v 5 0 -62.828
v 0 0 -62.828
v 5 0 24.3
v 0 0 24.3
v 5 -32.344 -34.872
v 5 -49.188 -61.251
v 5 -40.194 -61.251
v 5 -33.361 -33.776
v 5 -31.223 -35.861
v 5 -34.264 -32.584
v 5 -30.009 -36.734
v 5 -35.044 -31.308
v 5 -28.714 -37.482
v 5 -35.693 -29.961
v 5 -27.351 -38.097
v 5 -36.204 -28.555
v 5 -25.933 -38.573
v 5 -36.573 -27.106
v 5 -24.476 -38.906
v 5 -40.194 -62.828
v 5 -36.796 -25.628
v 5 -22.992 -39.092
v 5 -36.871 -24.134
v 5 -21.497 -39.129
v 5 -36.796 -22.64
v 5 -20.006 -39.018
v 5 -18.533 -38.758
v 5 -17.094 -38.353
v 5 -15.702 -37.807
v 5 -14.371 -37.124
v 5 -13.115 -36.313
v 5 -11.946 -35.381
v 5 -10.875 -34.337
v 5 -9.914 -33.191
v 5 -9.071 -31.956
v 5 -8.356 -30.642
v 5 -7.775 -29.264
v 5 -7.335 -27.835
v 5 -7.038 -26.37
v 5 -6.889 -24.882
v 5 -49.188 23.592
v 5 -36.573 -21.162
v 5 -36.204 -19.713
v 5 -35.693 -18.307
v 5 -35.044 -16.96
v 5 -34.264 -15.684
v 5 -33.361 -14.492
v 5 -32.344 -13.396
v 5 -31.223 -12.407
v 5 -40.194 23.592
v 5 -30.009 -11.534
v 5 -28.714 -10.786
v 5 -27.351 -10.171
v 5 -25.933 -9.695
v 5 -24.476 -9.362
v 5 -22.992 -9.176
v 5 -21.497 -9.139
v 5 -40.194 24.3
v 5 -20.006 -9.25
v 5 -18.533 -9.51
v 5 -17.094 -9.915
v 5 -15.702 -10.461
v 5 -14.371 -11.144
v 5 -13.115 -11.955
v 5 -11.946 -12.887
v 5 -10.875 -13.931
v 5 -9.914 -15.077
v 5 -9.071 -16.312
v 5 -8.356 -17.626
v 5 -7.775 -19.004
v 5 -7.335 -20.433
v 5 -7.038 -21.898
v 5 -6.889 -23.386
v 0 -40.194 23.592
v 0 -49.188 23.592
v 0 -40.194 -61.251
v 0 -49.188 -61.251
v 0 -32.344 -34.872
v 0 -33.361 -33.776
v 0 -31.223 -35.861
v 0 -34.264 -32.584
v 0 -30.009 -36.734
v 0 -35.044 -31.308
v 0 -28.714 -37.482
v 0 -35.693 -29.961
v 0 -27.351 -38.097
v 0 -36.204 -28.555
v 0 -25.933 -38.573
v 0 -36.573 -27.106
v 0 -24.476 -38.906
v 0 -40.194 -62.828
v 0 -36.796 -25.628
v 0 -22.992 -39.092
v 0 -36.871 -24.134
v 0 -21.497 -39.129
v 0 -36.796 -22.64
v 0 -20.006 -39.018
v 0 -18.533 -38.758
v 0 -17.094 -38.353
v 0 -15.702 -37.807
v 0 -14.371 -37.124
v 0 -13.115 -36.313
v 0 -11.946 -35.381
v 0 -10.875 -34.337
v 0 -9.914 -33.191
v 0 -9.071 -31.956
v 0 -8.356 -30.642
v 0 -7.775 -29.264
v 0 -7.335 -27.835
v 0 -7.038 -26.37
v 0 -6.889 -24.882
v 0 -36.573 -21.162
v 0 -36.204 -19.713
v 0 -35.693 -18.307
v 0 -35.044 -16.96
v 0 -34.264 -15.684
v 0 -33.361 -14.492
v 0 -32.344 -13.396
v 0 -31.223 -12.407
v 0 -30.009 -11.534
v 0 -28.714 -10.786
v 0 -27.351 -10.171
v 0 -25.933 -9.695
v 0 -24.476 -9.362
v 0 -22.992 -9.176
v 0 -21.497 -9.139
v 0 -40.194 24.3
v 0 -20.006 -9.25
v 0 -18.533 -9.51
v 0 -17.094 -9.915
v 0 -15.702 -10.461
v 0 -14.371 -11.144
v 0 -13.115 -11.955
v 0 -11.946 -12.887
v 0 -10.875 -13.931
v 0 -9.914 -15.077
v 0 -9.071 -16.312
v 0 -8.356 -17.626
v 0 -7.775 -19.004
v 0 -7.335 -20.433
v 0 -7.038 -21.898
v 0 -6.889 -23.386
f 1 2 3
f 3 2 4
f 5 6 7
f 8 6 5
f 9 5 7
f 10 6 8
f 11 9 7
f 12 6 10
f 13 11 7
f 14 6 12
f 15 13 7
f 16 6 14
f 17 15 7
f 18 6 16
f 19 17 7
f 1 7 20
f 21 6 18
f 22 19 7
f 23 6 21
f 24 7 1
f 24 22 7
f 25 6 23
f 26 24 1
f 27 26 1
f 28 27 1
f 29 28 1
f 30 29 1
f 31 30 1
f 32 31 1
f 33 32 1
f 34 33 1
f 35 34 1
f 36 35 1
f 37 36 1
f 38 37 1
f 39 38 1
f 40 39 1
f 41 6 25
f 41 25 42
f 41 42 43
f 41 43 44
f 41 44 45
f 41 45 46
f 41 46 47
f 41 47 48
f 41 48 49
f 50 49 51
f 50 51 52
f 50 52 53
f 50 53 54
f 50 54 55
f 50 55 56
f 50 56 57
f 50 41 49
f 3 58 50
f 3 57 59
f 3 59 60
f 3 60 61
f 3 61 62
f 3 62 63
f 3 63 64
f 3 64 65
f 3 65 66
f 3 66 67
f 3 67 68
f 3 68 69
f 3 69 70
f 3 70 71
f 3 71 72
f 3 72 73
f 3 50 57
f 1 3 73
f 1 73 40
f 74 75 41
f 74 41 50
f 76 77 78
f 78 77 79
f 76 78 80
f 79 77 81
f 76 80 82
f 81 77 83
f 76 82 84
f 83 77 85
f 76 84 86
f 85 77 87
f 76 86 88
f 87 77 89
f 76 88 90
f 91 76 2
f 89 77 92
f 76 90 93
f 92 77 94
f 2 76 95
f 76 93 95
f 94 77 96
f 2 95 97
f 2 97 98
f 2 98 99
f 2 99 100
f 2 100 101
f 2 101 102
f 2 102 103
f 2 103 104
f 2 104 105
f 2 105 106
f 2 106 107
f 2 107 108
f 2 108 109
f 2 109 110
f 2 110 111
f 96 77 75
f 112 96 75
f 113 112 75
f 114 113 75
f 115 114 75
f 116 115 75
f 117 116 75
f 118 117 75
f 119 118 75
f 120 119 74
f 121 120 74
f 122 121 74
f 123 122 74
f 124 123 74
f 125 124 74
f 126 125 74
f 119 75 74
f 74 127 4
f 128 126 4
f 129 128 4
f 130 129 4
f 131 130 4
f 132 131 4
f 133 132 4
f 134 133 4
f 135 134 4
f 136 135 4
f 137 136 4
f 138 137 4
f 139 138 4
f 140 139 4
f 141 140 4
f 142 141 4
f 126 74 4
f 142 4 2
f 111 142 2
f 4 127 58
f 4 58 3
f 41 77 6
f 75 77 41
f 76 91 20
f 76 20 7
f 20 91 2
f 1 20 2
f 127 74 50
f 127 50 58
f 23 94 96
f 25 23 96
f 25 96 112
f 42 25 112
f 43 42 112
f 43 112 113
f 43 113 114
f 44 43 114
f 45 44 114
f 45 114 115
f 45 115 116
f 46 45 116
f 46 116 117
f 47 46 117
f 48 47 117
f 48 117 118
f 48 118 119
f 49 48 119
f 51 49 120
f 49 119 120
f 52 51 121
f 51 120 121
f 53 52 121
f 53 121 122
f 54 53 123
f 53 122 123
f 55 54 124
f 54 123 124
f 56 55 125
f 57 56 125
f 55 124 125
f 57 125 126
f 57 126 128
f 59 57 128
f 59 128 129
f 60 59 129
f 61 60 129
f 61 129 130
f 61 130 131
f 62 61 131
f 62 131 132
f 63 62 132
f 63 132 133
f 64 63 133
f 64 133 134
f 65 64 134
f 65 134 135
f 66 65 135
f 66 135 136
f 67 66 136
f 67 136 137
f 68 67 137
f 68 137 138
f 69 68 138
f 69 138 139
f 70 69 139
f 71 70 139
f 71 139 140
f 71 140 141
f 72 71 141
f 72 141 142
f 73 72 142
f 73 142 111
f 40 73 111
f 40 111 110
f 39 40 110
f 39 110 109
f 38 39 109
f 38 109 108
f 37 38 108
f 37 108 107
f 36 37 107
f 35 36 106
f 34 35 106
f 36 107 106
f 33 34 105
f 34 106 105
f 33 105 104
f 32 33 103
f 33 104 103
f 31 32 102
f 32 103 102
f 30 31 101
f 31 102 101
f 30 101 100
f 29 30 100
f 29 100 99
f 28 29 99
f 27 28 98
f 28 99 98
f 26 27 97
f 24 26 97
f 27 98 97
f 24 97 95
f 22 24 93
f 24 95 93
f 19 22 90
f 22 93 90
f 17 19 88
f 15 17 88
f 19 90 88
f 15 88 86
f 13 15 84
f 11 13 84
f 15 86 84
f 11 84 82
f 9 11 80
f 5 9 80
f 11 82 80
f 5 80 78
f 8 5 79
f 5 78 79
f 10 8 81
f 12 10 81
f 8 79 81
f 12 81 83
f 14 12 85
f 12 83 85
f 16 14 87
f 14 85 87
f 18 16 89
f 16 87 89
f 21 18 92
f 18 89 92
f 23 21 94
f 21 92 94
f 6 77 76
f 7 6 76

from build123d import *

# Parameters (mm, degrees)
F0_W     = 40.193792
F0_H     = 87.127595
F1_DEPTH = 5
F3_D     = 30
F4_W     = 10.118723
F4_H     = 84.843202
F5_DEPTH = 5


with BuildPart() as f1:
    # F0 (on Right) → F1 (new body)
    with BuildSketch(Plane.YZ):
        with Locations((-20.096896, -19.263864)):
            Rectangle(F0_W, F0_H)
    extrude(amount=F1_DEPTH)

    # F3 (through all)
    with Locations(Plane.YZ.offset(5)):
        with Locations((-21.870809, -24.133997)):
            Hole(F3_D / 2)

    # F4 (on Right) → F5 (join)
    with BuildSketch(Plane.YZ):
        with Locations((-44.12885, -18.829883)):
            Rectangle(F4_W, F4_H)
    extrude(amount=F5_DEPTH)


solid = f1.part
